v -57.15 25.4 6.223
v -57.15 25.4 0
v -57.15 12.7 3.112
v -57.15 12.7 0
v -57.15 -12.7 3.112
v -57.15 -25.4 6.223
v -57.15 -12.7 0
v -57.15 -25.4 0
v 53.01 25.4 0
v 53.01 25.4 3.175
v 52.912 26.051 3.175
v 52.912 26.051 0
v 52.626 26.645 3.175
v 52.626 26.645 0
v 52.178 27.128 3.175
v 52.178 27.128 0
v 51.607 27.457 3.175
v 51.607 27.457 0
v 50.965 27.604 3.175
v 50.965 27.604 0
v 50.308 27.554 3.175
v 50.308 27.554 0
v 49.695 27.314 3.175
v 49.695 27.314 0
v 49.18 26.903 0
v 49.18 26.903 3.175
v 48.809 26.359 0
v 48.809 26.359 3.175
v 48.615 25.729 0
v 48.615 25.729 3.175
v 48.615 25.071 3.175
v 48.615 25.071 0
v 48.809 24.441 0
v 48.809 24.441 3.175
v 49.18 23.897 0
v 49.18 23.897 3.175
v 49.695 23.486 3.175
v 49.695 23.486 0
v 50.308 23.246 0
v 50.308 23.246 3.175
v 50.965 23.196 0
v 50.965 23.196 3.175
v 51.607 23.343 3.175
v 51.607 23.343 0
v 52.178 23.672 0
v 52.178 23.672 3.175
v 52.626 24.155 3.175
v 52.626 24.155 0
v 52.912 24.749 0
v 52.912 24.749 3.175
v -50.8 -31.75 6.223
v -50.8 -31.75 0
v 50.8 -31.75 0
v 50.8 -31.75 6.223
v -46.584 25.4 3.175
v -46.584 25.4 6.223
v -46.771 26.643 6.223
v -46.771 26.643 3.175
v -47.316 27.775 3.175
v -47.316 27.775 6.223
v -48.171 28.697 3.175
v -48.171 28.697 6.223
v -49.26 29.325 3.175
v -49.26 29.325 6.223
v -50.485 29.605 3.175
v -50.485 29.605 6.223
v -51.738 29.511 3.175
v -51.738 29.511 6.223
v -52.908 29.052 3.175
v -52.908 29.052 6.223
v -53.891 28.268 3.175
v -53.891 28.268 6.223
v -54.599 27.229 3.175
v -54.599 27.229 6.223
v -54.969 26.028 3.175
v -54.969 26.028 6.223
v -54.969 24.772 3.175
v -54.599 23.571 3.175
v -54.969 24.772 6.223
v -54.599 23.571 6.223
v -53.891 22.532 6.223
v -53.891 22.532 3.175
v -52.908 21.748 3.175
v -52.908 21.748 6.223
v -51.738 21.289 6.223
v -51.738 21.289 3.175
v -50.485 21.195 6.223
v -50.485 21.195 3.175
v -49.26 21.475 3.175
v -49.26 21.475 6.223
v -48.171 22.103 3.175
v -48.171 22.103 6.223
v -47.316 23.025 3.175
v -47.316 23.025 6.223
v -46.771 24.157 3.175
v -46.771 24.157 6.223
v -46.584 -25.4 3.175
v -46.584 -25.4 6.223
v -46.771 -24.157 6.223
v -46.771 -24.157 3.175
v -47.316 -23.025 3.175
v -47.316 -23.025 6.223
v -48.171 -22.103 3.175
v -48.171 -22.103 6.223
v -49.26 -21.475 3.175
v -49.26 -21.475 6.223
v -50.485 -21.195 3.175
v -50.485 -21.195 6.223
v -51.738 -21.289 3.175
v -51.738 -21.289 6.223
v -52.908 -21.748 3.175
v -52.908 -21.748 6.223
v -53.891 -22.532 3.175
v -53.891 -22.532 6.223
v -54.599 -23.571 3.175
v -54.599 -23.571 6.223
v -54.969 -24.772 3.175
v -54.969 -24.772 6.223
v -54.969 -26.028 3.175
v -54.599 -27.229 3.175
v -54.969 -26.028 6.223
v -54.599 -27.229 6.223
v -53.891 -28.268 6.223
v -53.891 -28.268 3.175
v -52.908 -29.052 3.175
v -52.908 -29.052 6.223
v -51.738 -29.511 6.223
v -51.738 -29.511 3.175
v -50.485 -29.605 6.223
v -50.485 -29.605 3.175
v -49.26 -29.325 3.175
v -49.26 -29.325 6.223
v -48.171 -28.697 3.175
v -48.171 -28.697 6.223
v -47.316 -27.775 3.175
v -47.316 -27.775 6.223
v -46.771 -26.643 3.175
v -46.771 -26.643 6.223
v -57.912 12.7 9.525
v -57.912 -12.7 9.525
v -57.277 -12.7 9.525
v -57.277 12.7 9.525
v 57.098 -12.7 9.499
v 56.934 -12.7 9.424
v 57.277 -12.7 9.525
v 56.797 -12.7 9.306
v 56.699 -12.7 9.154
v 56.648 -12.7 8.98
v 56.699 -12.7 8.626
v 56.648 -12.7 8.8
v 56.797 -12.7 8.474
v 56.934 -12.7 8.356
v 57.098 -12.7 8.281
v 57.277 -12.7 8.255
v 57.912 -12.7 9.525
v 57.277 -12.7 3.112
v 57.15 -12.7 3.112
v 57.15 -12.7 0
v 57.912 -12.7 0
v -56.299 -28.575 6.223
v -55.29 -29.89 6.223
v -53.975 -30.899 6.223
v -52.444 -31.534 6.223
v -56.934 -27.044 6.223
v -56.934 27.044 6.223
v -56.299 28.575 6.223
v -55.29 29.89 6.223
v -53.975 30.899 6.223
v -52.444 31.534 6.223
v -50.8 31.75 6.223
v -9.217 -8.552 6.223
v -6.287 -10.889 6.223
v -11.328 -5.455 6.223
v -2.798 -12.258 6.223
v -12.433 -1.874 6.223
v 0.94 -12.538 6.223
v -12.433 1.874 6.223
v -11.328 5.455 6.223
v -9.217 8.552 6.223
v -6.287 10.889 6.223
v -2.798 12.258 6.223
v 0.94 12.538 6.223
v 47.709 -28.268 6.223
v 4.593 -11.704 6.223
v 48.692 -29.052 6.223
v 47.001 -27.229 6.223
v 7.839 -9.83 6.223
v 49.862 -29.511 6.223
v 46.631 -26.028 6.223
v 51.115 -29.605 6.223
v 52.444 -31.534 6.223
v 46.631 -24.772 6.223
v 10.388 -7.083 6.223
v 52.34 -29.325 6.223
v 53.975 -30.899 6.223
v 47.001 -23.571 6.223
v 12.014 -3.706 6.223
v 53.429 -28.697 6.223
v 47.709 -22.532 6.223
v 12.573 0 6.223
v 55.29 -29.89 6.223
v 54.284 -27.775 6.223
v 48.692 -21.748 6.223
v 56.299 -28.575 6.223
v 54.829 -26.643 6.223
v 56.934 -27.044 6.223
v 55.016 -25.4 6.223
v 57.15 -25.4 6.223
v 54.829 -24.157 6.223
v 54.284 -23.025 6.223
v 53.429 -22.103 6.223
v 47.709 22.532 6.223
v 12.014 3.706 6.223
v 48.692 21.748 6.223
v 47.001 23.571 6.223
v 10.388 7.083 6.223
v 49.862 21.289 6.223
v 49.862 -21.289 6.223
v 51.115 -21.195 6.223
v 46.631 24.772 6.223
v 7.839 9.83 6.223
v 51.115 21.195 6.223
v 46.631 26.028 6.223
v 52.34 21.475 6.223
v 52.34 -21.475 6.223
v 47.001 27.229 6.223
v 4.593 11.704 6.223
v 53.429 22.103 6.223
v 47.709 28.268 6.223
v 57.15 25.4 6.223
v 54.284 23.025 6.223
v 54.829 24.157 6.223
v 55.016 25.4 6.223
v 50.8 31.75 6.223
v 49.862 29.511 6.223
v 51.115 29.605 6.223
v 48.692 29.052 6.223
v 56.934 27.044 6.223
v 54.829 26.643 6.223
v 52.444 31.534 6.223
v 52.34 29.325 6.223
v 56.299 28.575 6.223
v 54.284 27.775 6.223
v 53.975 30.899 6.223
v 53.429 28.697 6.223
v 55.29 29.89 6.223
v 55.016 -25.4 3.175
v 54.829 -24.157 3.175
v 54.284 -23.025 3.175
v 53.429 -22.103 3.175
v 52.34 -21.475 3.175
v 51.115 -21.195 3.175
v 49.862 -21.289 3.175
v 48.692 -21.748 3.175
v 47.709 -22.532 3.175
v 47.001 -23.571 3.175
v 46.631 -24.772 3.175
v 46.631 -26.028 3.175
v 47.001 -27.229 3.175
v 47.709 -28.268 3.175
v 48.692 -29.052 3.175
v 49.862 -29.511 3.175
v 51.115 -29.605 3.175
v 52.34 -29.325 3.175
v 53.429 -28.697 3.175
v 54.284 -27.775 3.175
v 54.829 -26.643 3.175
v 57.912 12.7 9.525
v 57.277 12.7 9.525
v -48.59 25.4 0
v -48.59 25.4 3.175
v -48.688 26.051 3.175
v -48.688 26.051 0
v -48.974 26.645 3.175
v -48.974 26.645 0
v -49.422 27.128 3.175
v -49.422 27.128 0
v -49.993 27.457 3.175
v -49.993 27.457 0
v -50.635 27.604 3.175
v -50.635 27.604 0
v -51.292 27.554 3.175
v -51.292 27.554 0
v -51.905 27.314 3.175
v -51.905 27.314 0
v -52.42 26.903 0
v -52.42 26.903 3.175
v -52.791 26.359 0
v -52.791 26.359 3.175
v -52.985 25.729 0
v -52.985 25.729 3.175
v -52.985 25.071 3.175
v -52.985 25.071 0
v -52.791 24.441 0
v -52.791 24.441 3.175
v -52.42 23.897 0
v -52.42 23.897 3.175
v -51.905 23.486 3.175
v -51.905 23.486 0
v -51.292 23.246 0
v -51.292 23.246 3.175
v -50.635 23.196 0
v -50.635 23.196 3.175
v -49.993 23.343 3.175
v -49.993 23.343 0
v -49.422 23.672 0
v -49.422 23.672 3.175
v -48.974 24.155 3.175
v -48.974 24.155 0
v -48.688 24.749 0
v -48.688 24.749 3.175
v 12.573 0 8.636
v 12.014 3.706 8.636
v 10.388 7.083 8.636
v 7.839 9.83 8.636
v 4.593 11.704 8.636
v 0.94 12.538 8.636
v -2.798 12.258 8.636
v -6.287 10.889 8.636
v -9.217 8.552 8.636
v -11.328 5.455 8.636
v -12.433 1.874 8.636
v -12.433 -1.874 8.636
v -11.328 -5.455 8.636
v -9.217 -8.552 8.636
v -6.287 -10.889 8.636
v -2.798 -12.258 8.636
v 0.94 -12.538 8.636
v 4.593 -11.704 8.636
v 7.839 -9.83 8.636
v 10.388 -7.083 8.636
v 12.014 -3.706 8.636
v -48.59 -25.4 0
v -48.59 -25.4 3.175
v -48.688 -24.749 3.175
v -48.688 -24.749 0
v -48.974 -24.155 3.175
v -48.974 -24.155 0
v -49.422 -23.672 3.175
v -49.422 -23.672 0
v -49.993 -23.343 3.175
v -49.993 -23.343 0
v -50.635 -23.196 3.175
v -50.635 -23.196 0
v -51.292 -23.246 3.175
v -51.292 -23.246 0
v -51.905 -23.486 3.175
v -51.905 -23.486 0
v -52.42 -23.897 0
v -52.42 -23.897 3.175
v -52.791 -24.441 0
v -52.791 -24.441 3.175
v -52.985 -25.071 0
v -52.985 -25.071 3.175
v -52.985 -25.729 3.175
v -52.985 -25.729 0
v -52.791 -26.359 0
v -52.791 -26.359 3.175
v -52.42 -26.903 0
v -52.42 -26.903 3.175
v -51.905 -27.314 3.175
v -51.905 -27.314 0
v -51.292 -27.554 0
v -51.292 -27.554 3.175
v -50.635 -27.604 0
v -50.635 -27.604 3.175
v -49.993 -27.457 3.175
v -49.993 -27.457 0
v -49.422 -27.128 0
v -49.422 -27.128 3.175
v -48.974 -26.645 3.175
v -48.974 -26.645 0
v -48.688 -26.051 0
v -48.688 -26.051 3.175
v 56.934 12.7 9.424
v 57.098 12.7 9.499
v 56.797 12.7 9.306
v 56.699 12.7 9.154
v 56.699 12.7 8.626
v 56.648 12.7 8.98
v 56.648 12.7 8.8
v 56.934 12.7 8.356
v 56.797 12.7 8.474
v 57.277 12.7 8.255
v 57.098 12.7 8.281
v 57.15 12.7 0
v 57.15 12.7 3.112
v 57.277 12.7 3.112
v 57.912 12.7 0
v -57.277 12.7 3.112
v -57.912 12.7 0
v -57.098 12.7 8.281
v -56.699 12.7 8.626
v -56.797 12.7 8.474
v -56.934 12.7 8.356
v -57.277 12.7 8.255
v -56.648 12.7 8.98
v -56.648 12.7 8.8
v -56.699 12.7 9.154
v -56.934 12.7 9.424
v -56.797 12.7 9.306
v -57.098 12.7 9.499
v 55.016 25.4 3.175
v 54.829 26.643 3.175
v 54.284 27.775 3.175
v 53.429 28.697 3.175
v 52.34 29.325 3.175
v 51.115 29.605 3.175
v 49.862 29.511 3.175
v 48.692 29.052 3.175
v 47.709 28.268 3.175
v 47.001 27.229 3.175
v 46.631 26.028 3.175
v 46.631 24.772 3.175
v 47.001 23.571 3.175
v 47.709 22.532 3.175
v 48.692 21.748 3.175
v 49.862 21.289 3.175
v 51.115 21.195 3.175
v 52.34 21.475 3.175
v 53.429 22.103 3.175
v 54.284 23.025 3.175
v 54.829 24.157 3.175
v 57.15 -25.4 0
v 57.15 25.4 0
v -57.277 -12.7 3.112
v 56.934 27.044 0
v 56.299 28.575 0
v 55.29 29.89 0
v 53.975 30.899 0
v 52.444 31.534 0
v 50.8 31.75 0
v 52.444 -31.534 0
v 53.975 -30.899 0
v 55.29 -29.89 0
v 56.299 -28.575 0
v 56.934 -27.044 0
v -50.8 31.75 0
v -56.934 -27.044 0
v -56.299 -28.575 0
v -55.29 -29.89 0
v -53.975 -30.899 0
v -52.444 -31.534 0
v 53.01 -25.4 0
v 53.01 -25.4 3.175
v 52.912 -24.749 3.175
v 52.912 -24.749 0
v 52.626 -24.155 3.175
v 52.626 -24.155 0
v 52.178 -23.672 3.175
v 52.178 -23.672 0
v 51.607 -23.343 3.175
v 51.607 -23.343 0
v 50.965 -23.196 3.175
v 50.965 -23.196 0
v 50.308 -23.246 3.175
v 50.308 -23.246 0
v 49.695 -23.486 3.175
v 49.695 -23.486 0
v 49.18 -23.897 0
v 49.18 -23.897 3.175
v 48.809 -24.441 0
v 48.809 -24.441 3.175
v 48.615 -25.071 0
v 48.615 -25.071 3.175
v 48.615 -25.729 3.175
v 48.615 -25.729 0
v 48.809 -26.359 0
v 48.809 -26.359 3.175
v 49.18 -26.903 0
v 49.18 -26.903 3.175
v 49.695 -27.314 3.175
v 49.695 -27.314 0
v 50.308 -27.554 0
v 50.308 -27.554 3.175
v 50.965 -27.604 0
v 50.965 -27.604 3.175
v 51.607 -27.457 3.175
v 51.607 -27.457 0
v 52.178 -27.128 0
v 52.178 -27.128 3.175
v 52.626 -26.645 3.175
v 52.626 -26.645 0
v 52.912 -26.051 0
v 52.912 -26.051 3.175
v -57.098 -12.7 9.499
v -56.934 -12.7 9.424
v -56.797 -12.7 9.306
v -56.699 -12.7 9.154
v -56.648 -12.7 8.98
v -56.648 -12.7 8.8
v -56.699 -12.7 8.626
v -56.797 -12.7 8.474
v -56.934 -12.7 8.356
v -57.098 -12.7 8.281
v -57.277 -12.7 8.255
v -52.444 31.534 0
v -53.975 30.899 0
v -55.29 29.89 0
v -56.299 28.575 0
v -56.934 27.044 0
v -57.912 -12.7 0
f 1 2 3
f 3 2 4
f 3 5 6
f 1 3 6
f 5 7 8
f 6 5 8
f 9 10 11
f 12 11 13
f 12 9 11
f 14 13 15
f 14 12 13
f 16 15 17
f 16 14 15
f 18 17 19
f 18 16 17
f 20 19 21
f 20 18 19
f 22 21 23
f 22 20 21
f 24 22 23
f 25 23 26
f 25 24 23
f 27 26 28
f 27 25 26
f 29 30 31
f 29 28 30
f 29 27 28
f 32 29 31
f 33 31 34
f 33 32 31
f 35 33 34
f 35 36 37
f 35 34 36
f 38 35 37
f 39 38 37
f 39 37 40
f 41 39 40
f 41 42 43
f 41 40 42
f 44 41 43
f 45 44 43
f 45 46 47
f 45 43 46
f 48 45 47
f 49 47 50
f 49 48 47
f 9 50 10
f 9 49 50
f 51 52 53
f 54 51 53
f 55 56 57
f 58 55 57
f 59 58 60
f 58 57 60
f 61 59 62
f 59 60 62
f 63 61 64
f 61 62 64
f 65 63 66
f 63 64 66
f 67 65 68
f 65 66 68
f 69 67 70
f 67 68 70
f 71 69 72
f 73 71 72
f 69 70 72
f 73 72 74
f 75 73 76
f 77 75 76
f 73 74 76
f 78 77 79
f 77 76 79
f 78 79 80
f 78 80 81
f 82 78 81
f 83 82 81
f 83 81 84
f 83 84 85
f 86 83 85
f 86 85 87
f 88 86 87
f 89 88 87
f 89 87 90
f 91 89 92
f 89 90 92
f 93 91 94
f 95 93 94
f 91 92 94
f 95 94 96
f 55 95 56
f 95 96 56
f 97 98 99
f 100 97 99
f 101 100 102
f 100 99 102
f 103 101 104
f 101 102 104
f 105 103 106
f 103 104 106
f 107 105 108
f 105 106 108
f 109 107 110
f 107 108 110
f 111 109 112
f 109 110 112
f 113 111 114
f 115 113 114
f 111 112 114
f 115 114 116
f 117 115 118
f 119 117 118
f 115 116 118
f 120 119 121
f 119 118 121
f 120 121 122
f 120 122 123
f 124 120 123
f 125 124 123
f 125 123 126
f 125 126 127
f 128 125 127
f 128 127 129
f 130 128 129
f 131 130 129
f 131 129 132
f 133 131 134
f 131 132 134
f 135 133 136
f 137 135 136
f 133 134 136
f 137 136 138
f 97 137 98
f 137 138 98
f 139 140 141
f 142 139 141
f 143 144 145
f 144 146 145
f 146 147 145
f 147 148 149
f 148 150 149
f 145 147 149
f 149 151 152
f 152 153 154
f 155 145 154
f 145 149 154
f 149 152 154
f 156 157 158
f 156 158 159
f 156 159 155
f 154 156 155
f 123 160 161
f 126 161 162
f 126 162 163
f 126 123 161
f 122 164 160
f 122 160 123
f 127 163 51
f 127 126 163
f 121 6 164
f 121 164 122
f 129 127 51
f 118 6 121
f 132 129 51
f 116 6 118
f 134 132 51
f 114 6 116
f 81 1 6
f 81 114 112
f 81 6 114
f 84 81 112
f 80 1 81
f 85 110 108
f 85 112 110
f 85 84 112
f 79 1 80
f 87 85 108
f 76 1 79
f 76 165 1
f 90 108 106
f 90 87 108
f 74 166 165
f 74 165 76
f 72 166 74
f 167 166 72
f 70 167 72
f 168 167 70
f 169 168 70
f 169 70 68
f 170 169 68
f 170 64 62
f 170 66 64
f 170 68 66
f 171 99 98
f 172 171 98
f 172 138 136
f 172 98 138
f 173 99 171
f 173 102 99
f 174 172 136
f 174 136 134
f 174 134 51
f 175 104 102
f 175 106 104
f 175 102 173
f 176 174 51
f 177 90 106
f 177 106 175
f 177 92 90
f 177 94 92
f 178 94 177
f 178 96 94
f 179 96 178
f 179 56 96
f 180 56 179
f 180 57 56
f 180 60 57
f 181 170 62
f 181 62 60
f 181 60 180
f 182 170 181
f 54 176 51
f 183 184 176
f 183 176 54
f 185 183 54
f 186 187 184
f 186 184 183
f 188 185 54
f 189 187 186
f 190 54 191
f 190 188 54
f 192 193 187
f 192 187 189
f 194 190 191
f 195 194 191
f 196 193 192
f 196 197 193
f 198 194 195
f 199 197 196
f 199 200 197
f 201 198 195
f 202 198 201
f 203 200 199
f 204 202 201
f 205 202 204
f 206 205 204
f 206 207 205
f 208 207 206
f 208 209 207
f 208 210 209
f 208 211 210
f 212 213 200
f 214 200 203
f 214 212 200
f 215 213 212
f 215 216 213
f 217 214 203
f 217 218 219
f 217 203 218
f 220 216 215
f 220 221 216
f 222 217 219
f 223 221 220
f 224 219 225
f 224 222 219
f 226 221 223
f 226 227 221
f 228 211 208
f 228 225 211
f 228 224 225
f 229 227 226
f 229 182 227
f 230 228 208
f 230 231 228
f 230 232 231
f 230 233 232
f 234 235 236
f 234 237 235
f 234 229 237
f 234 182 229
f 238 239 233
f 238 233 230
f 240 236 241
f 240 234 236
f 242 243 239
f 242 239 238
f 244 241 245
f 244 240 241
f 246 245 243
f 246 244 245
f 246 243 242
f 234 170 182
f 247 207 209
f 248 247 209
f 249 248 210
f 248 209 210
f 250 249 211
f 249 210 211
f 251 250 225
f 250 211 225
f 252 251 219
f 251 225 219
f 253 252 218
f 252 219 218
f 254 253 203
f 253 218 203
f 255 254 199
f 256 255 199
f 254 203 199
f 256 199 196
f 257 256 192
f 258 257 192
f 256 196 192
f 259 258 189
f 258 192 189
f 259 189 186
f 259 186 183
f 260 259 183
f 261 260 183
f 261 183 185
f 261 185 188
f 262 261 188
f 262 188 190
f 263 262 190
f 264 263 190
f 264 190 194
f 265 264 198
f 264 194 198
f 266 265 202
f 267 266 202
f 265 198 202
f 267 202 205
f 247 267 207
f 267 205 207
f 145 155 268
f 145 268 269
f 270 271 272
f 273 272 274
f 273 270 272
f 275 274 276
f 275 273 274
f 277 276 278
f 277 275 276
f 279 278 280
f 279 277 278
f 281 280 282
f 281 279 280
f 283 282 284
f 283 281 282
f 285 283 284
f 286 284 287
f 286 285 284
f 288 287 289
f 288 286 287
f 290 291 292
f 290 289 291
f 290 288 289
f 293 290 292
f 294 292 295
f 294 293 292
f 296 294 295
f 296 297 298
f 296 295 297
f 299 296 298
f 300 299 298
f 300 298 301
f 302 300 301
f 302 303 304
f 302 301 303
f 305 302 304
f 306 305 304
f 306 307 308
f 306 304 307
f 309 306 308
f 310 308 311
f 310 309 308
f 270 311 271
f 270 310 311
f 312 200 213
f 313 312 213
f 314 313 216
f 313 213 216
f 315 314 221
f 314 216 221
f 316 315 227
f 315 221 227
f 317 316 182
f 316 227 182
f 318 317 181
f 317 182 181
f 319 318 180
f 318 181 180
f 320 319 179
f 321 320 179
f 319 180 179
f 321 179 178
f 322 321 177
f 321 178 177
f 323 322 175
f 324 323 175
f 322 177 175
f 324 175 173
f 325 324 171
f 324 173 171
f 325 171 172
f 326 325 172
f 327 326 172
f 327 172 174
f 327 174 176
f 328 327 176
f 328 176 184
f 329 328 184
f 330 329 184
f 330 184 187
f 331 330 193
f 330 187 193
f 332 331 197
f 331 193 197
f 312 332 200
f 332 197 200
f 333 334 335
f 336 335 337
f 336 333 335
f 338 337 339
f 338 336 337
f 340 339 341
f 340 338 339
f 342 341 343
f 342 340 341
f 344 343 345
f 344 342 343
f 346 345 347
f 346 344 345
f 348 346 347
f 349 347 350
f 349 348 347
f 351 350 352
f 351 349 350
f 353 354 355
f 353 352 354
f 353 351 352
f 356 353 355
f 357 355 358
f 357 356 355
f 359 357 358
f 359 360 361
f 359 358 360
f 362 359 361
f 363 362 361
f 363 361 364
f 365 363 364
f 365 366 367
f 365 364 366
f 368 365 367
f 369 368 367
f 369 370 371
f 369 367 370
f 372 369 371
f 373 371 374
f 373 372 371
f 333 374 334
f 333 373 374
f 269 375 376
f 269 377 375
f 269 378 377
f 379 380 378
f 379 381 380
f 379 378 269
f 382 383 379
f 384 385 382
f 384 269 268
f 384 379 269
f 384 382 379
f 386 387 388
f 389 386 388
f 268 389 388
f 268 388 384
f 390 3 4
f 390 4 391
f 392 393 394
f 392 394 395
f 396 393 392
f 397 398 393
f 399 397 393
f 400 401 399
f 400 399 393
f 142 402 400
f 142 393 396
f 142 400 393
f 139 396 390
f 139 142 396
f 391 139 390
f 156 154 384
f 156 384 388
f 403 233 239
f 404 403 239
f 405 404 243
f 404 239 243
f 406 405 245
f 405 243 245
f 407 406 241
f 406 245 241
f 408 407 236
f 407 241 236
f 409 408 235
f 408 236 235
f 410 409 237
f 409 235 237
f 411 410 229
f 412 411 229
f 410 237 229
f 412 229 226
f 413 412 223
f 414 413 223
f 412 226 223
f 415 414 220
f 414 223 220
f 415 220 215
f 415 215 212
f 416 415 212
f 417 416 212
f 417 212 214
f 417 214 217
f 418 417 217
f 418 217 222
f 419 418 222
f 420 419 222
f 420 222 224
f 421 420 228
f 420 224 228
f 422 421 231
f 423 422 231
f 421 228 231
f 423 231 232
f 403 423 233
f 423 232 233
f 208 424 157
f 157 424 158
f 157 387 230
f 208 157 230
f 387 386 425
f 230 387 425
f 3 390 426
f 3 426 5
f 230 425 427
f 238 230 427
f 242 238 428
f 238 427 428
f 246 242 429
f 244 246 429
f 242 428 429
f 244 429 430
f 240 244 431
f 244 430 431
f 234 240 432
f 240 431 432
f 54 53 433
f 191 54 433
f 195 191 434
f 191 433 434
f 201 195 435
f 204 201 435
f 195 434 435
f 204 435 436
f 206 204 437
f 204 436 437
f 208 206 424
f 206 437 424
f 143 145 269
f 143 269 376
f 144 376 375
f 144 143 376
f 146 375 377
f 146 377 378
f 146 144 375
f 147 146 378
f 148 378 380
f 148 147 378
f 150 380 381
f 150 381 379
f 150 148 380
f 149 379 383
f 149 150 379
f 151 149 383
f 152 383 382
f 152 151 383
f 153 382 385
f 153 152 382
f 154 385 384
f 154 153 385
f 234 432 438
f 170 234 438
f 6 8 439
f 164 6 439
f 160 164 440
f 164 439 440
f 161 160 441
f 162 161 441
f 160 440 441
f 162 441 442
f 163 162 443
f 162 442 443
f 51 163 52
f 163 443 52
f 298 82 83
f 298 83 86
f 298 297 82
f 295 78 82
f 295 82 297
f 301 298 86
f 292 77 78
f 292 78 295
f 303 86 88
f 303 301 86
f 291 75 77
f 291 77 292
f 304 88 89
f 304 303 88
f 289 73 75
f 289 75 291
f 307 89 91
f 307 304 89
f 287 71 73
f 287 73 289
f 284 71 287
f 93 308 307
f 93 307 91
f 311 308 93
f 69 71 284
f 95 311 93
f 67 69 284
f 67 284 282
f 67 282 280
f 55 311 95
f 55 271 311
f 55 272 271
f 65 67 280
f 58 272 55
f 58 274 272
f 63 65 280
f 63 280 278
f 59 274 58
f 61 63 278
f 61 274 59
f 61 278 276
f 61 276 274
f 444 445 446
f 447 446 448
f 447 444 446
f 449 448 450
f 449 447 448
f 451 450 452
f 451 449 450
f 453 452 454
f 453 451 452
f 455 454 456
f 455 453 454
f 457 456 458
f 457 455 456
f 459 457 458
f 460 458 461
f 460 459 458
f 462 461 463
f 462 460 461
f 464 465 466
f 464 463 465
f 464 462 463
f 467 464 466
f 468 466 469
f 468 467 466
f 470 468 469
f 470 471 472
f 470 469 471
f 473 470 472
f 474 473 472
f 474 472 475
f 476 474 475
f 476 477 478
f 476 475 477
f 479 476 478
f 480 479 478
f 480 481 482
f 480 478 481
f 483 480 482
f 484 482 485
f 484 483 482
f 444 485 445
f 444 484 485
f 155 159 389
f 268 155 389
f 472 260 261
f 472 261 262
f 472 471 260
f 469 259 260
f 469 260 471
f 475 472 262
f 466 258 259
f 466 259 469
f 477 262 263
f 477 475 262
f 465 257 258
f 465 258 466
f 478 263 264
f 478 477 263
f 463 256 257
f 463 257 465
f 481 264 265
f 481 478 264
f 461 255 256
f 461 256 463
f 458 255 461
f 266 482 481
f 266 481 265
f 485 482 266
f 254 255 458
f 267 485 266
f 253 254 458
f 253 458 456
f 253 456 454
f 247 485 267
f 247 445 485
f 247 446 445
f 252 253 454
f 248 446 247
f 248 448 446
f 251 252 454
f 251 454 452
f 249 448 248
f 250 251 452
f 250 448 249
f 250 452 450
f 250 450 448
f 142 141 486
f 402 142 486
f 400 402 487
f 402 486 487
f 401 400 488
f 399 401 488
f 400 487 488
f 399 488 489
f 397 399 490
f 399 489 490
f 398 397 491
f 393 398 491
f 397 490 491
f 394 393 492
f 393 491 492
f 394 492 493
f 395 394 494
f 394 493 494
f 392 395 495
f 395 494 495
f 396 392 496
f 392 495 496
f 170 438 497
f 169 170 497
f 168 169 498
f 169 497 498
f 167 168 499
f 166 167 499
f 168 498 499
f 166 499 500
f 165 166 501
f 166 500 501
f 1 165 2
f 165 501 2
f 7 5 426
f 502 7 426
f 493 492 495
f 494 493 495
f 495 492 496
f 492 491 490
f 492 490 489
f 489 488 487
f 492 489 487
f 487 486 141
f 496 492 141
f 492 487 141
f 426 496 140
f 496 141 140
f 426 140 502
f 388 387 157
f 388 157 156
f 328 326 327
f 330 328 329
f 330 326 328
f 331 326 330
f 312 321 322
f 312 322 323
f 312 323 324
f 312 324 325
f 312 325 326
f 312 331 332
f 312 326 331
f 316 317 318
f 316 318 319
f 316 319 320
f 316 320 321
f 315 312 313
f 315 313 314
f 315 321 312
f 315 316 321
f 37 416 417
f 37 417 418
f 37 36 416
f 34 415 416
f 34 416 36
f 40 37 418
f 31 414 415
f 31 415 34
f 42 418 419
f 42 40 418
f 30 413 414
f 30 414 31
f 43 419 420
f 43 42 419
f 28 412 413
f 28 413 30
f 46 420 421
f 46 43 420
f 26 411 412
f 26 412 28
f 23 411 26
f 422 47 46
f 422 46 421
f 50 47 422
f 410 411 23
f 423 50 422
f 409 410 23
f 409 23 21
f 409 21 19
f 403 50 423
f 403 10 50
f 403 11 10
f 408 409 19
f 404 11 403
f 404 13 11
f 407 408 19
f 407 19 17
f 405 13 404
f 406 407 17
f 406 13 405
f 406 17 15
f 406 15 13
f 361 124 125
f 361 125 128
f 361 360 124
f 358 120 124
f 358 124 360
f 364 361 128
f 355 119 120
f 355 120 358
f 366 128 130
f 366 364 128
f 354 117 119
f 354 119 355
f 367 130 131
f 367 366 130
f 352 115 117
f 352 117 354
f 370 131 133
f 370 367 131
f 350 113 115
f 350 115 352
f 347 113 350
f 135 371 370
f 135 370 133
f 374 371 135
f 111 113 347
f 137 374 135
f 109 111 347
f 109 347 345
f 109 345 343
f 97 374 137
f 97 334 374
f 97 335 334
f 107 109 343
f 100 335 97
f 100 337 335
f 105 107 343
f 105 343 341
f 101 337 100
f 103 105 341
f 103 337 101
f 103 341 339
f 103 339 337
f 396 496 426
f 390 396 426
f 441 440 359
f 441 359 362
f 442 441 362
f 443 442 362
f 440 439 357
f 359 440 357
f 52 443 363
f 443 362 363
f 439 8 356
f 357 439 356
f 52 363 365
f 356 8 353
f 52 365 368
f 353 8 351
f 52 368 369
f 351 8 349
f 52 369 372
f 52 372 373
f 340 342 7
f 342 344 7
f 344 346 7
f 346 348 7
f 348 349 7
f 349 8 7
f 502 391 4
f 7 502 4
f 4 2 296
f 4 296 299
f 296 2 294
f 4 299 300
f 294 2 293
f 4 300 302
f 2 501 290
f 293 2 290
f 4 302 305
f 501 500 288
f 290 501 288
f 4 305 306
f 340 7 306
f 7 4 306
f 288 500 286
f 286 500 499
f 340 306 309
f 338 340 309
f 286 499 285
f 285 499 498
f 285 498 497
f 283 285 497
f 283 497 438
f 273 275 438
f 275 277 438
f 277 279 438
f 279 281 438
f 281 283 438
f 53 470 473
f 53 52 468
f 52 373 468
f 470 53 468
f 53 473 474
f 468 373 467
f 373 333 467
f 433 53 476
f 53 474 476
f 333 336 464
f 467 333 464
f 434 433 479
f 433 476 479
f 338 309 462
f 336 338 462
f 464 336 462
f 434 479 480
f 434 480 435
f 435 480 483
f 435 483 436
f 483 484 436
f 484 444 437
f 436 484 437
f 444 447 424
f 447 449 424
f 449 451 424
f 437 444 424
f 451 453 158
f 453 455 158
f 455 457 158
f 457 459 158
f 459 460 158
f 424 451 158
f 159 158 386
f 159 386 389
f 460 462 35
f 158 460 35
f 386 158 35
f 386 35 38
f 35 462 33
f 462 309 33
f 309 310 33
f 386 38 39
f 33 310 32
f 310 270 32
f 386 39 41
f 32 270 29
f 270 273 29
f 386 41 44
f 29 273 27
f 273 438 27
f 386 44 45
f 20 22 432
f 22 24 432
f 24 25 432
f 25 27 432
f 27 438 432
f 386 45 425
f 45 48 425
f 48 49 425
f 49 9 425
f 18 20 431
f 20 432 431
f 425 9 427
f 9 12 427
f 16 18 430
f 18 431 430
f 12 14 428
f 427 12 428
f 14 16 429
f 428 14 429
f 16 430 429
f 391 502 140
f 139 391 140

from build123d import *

# Parameters (mm, degrees)
SKETCH1_R           = 2.2098
BOSS_EXTRUDE1_DEPTH = 6.223
SKETCH2_R           = 4.2164
CUT_EXTRUDE1_DEPTH  = 3.048
SKETCH4_W           = 0.762
SKETCH4_H           = 25.4
BOSS_EXTRUDE2_DEPTH = 3.1115
BOSS_EXTRUDE3_DEPTH = 25.4
SKETCH6_R           = 12.573
BOSS_EXTRUDE4_DEPTH = 2.413


with BuildPart() as part:
    # Sketch1 → Boss-Extrude1 (new body)
    with BuildSketch(Plane.XY):
        with BuildLine():
            Line((-50.8, -31.75), (50.8, -31.75))
            ThreePointArc((50.8, -31.75), (55.290128061, -29.890128061), (57.15, -25.4))
            Line((57.15, -25.4), (57.15, 25.4))
            ThreePointArc((57.15, 25.4), (55.290128061, 29.890128061), (50.8, 31.75))
            Line((50.8, 31.75), (-50.8, 31.75))
            ThreePointArc((-50.8, 31.75), (-55.290128061, 29.890128061), (-57.15, 25.4))
            Line((-57.15, 25.4), (-57.15, -25.4))
            ThreePointArc((-57.15, -25.4), (-55.290128061, -29.890128061), (-50.8, -31.75))
        make_face()
        with Locations((-50.8, -25.4)):
            Circle(SKETCH1_R, mode=Mode.SUBTRACT)
        with Locations((-50.8, 25.4)):
            Circle(SKETCH1_R, mode=Mode.SUBTRACT)
        with Locations((50.8, 25.4)):
            Circle(SKETCH1_R, mode=Mode.SUBTRACT)
        with Locations((50.8, -25.4)):
            Circle(SKETCH1_R, mode=Mode.SUBTRACT)
    extrude(amount=BOSS_EXTRUDE1_DEPTH)

    # Sketch2 → Cut-Extrude1 (cut)
    with BuildSketch(Plane.XY.offset(6.223)):
        with Locations((-50.8, 25.4)):
            Circle(SKETCH2_R)
        with Locations((50.8, 25.4)):
            Circle(SKETCH2_R)
        with Locations((50.8, -25.4)):
            Circle(SKETCH2_R)
        with Locations((-50.8, -25.4)):
            Circle(SKETCH2_R)
    extrude(amount=-CUT_EXTRUDE1_DEPTH, mode=Mode.SUBTRACT)

    # Sketch4 → Boss-Extrude2 (add)
    with BuildSketch(Plane.XY):
        with Locations((-57.531, 0)):
            Rectangle(SKETCH4_W, SKETCH4_H)
        with Locations((57.531, 0)):
            Rectangle(SKETCH4_W, SKETCH4_H)
    extrude(amount=BOSS_EXTRUDE2_DEPTH)

    # Sketch5 → Boss-Extrude3 (add)
    with BuildSketch(Plane.XZ.offset(12.7)):
        with BuildLine():
            Line((-57.277, 3.1115), (-57.912, 3.1115))
            Line((-57.912, 3.1115), (-57.912, 9.525))
            Line((-57.912, 9.525), (-57.277, 9.525))
            ThreePointArc((-57.277, 9.525), (-56.642, 8.89), (-57.277, 8.255))
            Line((-57.277, 8.255), (-57.277, 3.1115))
        make_face()
        with BuildLine():
            Line((57.912, 9.525), (57.277, 9.525))
            ThreePointArc((57.277, 9.525), (56.642, 8.89), (57.277, 8.255))
            Line((57.277, 8.255), (57.277, 3.1115))
            Line((57.277, 3.1115), (57.912, 3.1115))
            Line((57.912, 3.1115), (57.912, 9.525))
        make_face()
    extrude(amount=-BOSS_EXTRUDE3_DEPTH)

    # Sketch6 → Boss-Extrude4 (add)
    with BuildSketch(Plane.XY.offset(6.223)):
        Circle(SKETCH6_R)
    extrude(amount=BOSS_EXTRUDE4_DEPTH)


solid = part.part
